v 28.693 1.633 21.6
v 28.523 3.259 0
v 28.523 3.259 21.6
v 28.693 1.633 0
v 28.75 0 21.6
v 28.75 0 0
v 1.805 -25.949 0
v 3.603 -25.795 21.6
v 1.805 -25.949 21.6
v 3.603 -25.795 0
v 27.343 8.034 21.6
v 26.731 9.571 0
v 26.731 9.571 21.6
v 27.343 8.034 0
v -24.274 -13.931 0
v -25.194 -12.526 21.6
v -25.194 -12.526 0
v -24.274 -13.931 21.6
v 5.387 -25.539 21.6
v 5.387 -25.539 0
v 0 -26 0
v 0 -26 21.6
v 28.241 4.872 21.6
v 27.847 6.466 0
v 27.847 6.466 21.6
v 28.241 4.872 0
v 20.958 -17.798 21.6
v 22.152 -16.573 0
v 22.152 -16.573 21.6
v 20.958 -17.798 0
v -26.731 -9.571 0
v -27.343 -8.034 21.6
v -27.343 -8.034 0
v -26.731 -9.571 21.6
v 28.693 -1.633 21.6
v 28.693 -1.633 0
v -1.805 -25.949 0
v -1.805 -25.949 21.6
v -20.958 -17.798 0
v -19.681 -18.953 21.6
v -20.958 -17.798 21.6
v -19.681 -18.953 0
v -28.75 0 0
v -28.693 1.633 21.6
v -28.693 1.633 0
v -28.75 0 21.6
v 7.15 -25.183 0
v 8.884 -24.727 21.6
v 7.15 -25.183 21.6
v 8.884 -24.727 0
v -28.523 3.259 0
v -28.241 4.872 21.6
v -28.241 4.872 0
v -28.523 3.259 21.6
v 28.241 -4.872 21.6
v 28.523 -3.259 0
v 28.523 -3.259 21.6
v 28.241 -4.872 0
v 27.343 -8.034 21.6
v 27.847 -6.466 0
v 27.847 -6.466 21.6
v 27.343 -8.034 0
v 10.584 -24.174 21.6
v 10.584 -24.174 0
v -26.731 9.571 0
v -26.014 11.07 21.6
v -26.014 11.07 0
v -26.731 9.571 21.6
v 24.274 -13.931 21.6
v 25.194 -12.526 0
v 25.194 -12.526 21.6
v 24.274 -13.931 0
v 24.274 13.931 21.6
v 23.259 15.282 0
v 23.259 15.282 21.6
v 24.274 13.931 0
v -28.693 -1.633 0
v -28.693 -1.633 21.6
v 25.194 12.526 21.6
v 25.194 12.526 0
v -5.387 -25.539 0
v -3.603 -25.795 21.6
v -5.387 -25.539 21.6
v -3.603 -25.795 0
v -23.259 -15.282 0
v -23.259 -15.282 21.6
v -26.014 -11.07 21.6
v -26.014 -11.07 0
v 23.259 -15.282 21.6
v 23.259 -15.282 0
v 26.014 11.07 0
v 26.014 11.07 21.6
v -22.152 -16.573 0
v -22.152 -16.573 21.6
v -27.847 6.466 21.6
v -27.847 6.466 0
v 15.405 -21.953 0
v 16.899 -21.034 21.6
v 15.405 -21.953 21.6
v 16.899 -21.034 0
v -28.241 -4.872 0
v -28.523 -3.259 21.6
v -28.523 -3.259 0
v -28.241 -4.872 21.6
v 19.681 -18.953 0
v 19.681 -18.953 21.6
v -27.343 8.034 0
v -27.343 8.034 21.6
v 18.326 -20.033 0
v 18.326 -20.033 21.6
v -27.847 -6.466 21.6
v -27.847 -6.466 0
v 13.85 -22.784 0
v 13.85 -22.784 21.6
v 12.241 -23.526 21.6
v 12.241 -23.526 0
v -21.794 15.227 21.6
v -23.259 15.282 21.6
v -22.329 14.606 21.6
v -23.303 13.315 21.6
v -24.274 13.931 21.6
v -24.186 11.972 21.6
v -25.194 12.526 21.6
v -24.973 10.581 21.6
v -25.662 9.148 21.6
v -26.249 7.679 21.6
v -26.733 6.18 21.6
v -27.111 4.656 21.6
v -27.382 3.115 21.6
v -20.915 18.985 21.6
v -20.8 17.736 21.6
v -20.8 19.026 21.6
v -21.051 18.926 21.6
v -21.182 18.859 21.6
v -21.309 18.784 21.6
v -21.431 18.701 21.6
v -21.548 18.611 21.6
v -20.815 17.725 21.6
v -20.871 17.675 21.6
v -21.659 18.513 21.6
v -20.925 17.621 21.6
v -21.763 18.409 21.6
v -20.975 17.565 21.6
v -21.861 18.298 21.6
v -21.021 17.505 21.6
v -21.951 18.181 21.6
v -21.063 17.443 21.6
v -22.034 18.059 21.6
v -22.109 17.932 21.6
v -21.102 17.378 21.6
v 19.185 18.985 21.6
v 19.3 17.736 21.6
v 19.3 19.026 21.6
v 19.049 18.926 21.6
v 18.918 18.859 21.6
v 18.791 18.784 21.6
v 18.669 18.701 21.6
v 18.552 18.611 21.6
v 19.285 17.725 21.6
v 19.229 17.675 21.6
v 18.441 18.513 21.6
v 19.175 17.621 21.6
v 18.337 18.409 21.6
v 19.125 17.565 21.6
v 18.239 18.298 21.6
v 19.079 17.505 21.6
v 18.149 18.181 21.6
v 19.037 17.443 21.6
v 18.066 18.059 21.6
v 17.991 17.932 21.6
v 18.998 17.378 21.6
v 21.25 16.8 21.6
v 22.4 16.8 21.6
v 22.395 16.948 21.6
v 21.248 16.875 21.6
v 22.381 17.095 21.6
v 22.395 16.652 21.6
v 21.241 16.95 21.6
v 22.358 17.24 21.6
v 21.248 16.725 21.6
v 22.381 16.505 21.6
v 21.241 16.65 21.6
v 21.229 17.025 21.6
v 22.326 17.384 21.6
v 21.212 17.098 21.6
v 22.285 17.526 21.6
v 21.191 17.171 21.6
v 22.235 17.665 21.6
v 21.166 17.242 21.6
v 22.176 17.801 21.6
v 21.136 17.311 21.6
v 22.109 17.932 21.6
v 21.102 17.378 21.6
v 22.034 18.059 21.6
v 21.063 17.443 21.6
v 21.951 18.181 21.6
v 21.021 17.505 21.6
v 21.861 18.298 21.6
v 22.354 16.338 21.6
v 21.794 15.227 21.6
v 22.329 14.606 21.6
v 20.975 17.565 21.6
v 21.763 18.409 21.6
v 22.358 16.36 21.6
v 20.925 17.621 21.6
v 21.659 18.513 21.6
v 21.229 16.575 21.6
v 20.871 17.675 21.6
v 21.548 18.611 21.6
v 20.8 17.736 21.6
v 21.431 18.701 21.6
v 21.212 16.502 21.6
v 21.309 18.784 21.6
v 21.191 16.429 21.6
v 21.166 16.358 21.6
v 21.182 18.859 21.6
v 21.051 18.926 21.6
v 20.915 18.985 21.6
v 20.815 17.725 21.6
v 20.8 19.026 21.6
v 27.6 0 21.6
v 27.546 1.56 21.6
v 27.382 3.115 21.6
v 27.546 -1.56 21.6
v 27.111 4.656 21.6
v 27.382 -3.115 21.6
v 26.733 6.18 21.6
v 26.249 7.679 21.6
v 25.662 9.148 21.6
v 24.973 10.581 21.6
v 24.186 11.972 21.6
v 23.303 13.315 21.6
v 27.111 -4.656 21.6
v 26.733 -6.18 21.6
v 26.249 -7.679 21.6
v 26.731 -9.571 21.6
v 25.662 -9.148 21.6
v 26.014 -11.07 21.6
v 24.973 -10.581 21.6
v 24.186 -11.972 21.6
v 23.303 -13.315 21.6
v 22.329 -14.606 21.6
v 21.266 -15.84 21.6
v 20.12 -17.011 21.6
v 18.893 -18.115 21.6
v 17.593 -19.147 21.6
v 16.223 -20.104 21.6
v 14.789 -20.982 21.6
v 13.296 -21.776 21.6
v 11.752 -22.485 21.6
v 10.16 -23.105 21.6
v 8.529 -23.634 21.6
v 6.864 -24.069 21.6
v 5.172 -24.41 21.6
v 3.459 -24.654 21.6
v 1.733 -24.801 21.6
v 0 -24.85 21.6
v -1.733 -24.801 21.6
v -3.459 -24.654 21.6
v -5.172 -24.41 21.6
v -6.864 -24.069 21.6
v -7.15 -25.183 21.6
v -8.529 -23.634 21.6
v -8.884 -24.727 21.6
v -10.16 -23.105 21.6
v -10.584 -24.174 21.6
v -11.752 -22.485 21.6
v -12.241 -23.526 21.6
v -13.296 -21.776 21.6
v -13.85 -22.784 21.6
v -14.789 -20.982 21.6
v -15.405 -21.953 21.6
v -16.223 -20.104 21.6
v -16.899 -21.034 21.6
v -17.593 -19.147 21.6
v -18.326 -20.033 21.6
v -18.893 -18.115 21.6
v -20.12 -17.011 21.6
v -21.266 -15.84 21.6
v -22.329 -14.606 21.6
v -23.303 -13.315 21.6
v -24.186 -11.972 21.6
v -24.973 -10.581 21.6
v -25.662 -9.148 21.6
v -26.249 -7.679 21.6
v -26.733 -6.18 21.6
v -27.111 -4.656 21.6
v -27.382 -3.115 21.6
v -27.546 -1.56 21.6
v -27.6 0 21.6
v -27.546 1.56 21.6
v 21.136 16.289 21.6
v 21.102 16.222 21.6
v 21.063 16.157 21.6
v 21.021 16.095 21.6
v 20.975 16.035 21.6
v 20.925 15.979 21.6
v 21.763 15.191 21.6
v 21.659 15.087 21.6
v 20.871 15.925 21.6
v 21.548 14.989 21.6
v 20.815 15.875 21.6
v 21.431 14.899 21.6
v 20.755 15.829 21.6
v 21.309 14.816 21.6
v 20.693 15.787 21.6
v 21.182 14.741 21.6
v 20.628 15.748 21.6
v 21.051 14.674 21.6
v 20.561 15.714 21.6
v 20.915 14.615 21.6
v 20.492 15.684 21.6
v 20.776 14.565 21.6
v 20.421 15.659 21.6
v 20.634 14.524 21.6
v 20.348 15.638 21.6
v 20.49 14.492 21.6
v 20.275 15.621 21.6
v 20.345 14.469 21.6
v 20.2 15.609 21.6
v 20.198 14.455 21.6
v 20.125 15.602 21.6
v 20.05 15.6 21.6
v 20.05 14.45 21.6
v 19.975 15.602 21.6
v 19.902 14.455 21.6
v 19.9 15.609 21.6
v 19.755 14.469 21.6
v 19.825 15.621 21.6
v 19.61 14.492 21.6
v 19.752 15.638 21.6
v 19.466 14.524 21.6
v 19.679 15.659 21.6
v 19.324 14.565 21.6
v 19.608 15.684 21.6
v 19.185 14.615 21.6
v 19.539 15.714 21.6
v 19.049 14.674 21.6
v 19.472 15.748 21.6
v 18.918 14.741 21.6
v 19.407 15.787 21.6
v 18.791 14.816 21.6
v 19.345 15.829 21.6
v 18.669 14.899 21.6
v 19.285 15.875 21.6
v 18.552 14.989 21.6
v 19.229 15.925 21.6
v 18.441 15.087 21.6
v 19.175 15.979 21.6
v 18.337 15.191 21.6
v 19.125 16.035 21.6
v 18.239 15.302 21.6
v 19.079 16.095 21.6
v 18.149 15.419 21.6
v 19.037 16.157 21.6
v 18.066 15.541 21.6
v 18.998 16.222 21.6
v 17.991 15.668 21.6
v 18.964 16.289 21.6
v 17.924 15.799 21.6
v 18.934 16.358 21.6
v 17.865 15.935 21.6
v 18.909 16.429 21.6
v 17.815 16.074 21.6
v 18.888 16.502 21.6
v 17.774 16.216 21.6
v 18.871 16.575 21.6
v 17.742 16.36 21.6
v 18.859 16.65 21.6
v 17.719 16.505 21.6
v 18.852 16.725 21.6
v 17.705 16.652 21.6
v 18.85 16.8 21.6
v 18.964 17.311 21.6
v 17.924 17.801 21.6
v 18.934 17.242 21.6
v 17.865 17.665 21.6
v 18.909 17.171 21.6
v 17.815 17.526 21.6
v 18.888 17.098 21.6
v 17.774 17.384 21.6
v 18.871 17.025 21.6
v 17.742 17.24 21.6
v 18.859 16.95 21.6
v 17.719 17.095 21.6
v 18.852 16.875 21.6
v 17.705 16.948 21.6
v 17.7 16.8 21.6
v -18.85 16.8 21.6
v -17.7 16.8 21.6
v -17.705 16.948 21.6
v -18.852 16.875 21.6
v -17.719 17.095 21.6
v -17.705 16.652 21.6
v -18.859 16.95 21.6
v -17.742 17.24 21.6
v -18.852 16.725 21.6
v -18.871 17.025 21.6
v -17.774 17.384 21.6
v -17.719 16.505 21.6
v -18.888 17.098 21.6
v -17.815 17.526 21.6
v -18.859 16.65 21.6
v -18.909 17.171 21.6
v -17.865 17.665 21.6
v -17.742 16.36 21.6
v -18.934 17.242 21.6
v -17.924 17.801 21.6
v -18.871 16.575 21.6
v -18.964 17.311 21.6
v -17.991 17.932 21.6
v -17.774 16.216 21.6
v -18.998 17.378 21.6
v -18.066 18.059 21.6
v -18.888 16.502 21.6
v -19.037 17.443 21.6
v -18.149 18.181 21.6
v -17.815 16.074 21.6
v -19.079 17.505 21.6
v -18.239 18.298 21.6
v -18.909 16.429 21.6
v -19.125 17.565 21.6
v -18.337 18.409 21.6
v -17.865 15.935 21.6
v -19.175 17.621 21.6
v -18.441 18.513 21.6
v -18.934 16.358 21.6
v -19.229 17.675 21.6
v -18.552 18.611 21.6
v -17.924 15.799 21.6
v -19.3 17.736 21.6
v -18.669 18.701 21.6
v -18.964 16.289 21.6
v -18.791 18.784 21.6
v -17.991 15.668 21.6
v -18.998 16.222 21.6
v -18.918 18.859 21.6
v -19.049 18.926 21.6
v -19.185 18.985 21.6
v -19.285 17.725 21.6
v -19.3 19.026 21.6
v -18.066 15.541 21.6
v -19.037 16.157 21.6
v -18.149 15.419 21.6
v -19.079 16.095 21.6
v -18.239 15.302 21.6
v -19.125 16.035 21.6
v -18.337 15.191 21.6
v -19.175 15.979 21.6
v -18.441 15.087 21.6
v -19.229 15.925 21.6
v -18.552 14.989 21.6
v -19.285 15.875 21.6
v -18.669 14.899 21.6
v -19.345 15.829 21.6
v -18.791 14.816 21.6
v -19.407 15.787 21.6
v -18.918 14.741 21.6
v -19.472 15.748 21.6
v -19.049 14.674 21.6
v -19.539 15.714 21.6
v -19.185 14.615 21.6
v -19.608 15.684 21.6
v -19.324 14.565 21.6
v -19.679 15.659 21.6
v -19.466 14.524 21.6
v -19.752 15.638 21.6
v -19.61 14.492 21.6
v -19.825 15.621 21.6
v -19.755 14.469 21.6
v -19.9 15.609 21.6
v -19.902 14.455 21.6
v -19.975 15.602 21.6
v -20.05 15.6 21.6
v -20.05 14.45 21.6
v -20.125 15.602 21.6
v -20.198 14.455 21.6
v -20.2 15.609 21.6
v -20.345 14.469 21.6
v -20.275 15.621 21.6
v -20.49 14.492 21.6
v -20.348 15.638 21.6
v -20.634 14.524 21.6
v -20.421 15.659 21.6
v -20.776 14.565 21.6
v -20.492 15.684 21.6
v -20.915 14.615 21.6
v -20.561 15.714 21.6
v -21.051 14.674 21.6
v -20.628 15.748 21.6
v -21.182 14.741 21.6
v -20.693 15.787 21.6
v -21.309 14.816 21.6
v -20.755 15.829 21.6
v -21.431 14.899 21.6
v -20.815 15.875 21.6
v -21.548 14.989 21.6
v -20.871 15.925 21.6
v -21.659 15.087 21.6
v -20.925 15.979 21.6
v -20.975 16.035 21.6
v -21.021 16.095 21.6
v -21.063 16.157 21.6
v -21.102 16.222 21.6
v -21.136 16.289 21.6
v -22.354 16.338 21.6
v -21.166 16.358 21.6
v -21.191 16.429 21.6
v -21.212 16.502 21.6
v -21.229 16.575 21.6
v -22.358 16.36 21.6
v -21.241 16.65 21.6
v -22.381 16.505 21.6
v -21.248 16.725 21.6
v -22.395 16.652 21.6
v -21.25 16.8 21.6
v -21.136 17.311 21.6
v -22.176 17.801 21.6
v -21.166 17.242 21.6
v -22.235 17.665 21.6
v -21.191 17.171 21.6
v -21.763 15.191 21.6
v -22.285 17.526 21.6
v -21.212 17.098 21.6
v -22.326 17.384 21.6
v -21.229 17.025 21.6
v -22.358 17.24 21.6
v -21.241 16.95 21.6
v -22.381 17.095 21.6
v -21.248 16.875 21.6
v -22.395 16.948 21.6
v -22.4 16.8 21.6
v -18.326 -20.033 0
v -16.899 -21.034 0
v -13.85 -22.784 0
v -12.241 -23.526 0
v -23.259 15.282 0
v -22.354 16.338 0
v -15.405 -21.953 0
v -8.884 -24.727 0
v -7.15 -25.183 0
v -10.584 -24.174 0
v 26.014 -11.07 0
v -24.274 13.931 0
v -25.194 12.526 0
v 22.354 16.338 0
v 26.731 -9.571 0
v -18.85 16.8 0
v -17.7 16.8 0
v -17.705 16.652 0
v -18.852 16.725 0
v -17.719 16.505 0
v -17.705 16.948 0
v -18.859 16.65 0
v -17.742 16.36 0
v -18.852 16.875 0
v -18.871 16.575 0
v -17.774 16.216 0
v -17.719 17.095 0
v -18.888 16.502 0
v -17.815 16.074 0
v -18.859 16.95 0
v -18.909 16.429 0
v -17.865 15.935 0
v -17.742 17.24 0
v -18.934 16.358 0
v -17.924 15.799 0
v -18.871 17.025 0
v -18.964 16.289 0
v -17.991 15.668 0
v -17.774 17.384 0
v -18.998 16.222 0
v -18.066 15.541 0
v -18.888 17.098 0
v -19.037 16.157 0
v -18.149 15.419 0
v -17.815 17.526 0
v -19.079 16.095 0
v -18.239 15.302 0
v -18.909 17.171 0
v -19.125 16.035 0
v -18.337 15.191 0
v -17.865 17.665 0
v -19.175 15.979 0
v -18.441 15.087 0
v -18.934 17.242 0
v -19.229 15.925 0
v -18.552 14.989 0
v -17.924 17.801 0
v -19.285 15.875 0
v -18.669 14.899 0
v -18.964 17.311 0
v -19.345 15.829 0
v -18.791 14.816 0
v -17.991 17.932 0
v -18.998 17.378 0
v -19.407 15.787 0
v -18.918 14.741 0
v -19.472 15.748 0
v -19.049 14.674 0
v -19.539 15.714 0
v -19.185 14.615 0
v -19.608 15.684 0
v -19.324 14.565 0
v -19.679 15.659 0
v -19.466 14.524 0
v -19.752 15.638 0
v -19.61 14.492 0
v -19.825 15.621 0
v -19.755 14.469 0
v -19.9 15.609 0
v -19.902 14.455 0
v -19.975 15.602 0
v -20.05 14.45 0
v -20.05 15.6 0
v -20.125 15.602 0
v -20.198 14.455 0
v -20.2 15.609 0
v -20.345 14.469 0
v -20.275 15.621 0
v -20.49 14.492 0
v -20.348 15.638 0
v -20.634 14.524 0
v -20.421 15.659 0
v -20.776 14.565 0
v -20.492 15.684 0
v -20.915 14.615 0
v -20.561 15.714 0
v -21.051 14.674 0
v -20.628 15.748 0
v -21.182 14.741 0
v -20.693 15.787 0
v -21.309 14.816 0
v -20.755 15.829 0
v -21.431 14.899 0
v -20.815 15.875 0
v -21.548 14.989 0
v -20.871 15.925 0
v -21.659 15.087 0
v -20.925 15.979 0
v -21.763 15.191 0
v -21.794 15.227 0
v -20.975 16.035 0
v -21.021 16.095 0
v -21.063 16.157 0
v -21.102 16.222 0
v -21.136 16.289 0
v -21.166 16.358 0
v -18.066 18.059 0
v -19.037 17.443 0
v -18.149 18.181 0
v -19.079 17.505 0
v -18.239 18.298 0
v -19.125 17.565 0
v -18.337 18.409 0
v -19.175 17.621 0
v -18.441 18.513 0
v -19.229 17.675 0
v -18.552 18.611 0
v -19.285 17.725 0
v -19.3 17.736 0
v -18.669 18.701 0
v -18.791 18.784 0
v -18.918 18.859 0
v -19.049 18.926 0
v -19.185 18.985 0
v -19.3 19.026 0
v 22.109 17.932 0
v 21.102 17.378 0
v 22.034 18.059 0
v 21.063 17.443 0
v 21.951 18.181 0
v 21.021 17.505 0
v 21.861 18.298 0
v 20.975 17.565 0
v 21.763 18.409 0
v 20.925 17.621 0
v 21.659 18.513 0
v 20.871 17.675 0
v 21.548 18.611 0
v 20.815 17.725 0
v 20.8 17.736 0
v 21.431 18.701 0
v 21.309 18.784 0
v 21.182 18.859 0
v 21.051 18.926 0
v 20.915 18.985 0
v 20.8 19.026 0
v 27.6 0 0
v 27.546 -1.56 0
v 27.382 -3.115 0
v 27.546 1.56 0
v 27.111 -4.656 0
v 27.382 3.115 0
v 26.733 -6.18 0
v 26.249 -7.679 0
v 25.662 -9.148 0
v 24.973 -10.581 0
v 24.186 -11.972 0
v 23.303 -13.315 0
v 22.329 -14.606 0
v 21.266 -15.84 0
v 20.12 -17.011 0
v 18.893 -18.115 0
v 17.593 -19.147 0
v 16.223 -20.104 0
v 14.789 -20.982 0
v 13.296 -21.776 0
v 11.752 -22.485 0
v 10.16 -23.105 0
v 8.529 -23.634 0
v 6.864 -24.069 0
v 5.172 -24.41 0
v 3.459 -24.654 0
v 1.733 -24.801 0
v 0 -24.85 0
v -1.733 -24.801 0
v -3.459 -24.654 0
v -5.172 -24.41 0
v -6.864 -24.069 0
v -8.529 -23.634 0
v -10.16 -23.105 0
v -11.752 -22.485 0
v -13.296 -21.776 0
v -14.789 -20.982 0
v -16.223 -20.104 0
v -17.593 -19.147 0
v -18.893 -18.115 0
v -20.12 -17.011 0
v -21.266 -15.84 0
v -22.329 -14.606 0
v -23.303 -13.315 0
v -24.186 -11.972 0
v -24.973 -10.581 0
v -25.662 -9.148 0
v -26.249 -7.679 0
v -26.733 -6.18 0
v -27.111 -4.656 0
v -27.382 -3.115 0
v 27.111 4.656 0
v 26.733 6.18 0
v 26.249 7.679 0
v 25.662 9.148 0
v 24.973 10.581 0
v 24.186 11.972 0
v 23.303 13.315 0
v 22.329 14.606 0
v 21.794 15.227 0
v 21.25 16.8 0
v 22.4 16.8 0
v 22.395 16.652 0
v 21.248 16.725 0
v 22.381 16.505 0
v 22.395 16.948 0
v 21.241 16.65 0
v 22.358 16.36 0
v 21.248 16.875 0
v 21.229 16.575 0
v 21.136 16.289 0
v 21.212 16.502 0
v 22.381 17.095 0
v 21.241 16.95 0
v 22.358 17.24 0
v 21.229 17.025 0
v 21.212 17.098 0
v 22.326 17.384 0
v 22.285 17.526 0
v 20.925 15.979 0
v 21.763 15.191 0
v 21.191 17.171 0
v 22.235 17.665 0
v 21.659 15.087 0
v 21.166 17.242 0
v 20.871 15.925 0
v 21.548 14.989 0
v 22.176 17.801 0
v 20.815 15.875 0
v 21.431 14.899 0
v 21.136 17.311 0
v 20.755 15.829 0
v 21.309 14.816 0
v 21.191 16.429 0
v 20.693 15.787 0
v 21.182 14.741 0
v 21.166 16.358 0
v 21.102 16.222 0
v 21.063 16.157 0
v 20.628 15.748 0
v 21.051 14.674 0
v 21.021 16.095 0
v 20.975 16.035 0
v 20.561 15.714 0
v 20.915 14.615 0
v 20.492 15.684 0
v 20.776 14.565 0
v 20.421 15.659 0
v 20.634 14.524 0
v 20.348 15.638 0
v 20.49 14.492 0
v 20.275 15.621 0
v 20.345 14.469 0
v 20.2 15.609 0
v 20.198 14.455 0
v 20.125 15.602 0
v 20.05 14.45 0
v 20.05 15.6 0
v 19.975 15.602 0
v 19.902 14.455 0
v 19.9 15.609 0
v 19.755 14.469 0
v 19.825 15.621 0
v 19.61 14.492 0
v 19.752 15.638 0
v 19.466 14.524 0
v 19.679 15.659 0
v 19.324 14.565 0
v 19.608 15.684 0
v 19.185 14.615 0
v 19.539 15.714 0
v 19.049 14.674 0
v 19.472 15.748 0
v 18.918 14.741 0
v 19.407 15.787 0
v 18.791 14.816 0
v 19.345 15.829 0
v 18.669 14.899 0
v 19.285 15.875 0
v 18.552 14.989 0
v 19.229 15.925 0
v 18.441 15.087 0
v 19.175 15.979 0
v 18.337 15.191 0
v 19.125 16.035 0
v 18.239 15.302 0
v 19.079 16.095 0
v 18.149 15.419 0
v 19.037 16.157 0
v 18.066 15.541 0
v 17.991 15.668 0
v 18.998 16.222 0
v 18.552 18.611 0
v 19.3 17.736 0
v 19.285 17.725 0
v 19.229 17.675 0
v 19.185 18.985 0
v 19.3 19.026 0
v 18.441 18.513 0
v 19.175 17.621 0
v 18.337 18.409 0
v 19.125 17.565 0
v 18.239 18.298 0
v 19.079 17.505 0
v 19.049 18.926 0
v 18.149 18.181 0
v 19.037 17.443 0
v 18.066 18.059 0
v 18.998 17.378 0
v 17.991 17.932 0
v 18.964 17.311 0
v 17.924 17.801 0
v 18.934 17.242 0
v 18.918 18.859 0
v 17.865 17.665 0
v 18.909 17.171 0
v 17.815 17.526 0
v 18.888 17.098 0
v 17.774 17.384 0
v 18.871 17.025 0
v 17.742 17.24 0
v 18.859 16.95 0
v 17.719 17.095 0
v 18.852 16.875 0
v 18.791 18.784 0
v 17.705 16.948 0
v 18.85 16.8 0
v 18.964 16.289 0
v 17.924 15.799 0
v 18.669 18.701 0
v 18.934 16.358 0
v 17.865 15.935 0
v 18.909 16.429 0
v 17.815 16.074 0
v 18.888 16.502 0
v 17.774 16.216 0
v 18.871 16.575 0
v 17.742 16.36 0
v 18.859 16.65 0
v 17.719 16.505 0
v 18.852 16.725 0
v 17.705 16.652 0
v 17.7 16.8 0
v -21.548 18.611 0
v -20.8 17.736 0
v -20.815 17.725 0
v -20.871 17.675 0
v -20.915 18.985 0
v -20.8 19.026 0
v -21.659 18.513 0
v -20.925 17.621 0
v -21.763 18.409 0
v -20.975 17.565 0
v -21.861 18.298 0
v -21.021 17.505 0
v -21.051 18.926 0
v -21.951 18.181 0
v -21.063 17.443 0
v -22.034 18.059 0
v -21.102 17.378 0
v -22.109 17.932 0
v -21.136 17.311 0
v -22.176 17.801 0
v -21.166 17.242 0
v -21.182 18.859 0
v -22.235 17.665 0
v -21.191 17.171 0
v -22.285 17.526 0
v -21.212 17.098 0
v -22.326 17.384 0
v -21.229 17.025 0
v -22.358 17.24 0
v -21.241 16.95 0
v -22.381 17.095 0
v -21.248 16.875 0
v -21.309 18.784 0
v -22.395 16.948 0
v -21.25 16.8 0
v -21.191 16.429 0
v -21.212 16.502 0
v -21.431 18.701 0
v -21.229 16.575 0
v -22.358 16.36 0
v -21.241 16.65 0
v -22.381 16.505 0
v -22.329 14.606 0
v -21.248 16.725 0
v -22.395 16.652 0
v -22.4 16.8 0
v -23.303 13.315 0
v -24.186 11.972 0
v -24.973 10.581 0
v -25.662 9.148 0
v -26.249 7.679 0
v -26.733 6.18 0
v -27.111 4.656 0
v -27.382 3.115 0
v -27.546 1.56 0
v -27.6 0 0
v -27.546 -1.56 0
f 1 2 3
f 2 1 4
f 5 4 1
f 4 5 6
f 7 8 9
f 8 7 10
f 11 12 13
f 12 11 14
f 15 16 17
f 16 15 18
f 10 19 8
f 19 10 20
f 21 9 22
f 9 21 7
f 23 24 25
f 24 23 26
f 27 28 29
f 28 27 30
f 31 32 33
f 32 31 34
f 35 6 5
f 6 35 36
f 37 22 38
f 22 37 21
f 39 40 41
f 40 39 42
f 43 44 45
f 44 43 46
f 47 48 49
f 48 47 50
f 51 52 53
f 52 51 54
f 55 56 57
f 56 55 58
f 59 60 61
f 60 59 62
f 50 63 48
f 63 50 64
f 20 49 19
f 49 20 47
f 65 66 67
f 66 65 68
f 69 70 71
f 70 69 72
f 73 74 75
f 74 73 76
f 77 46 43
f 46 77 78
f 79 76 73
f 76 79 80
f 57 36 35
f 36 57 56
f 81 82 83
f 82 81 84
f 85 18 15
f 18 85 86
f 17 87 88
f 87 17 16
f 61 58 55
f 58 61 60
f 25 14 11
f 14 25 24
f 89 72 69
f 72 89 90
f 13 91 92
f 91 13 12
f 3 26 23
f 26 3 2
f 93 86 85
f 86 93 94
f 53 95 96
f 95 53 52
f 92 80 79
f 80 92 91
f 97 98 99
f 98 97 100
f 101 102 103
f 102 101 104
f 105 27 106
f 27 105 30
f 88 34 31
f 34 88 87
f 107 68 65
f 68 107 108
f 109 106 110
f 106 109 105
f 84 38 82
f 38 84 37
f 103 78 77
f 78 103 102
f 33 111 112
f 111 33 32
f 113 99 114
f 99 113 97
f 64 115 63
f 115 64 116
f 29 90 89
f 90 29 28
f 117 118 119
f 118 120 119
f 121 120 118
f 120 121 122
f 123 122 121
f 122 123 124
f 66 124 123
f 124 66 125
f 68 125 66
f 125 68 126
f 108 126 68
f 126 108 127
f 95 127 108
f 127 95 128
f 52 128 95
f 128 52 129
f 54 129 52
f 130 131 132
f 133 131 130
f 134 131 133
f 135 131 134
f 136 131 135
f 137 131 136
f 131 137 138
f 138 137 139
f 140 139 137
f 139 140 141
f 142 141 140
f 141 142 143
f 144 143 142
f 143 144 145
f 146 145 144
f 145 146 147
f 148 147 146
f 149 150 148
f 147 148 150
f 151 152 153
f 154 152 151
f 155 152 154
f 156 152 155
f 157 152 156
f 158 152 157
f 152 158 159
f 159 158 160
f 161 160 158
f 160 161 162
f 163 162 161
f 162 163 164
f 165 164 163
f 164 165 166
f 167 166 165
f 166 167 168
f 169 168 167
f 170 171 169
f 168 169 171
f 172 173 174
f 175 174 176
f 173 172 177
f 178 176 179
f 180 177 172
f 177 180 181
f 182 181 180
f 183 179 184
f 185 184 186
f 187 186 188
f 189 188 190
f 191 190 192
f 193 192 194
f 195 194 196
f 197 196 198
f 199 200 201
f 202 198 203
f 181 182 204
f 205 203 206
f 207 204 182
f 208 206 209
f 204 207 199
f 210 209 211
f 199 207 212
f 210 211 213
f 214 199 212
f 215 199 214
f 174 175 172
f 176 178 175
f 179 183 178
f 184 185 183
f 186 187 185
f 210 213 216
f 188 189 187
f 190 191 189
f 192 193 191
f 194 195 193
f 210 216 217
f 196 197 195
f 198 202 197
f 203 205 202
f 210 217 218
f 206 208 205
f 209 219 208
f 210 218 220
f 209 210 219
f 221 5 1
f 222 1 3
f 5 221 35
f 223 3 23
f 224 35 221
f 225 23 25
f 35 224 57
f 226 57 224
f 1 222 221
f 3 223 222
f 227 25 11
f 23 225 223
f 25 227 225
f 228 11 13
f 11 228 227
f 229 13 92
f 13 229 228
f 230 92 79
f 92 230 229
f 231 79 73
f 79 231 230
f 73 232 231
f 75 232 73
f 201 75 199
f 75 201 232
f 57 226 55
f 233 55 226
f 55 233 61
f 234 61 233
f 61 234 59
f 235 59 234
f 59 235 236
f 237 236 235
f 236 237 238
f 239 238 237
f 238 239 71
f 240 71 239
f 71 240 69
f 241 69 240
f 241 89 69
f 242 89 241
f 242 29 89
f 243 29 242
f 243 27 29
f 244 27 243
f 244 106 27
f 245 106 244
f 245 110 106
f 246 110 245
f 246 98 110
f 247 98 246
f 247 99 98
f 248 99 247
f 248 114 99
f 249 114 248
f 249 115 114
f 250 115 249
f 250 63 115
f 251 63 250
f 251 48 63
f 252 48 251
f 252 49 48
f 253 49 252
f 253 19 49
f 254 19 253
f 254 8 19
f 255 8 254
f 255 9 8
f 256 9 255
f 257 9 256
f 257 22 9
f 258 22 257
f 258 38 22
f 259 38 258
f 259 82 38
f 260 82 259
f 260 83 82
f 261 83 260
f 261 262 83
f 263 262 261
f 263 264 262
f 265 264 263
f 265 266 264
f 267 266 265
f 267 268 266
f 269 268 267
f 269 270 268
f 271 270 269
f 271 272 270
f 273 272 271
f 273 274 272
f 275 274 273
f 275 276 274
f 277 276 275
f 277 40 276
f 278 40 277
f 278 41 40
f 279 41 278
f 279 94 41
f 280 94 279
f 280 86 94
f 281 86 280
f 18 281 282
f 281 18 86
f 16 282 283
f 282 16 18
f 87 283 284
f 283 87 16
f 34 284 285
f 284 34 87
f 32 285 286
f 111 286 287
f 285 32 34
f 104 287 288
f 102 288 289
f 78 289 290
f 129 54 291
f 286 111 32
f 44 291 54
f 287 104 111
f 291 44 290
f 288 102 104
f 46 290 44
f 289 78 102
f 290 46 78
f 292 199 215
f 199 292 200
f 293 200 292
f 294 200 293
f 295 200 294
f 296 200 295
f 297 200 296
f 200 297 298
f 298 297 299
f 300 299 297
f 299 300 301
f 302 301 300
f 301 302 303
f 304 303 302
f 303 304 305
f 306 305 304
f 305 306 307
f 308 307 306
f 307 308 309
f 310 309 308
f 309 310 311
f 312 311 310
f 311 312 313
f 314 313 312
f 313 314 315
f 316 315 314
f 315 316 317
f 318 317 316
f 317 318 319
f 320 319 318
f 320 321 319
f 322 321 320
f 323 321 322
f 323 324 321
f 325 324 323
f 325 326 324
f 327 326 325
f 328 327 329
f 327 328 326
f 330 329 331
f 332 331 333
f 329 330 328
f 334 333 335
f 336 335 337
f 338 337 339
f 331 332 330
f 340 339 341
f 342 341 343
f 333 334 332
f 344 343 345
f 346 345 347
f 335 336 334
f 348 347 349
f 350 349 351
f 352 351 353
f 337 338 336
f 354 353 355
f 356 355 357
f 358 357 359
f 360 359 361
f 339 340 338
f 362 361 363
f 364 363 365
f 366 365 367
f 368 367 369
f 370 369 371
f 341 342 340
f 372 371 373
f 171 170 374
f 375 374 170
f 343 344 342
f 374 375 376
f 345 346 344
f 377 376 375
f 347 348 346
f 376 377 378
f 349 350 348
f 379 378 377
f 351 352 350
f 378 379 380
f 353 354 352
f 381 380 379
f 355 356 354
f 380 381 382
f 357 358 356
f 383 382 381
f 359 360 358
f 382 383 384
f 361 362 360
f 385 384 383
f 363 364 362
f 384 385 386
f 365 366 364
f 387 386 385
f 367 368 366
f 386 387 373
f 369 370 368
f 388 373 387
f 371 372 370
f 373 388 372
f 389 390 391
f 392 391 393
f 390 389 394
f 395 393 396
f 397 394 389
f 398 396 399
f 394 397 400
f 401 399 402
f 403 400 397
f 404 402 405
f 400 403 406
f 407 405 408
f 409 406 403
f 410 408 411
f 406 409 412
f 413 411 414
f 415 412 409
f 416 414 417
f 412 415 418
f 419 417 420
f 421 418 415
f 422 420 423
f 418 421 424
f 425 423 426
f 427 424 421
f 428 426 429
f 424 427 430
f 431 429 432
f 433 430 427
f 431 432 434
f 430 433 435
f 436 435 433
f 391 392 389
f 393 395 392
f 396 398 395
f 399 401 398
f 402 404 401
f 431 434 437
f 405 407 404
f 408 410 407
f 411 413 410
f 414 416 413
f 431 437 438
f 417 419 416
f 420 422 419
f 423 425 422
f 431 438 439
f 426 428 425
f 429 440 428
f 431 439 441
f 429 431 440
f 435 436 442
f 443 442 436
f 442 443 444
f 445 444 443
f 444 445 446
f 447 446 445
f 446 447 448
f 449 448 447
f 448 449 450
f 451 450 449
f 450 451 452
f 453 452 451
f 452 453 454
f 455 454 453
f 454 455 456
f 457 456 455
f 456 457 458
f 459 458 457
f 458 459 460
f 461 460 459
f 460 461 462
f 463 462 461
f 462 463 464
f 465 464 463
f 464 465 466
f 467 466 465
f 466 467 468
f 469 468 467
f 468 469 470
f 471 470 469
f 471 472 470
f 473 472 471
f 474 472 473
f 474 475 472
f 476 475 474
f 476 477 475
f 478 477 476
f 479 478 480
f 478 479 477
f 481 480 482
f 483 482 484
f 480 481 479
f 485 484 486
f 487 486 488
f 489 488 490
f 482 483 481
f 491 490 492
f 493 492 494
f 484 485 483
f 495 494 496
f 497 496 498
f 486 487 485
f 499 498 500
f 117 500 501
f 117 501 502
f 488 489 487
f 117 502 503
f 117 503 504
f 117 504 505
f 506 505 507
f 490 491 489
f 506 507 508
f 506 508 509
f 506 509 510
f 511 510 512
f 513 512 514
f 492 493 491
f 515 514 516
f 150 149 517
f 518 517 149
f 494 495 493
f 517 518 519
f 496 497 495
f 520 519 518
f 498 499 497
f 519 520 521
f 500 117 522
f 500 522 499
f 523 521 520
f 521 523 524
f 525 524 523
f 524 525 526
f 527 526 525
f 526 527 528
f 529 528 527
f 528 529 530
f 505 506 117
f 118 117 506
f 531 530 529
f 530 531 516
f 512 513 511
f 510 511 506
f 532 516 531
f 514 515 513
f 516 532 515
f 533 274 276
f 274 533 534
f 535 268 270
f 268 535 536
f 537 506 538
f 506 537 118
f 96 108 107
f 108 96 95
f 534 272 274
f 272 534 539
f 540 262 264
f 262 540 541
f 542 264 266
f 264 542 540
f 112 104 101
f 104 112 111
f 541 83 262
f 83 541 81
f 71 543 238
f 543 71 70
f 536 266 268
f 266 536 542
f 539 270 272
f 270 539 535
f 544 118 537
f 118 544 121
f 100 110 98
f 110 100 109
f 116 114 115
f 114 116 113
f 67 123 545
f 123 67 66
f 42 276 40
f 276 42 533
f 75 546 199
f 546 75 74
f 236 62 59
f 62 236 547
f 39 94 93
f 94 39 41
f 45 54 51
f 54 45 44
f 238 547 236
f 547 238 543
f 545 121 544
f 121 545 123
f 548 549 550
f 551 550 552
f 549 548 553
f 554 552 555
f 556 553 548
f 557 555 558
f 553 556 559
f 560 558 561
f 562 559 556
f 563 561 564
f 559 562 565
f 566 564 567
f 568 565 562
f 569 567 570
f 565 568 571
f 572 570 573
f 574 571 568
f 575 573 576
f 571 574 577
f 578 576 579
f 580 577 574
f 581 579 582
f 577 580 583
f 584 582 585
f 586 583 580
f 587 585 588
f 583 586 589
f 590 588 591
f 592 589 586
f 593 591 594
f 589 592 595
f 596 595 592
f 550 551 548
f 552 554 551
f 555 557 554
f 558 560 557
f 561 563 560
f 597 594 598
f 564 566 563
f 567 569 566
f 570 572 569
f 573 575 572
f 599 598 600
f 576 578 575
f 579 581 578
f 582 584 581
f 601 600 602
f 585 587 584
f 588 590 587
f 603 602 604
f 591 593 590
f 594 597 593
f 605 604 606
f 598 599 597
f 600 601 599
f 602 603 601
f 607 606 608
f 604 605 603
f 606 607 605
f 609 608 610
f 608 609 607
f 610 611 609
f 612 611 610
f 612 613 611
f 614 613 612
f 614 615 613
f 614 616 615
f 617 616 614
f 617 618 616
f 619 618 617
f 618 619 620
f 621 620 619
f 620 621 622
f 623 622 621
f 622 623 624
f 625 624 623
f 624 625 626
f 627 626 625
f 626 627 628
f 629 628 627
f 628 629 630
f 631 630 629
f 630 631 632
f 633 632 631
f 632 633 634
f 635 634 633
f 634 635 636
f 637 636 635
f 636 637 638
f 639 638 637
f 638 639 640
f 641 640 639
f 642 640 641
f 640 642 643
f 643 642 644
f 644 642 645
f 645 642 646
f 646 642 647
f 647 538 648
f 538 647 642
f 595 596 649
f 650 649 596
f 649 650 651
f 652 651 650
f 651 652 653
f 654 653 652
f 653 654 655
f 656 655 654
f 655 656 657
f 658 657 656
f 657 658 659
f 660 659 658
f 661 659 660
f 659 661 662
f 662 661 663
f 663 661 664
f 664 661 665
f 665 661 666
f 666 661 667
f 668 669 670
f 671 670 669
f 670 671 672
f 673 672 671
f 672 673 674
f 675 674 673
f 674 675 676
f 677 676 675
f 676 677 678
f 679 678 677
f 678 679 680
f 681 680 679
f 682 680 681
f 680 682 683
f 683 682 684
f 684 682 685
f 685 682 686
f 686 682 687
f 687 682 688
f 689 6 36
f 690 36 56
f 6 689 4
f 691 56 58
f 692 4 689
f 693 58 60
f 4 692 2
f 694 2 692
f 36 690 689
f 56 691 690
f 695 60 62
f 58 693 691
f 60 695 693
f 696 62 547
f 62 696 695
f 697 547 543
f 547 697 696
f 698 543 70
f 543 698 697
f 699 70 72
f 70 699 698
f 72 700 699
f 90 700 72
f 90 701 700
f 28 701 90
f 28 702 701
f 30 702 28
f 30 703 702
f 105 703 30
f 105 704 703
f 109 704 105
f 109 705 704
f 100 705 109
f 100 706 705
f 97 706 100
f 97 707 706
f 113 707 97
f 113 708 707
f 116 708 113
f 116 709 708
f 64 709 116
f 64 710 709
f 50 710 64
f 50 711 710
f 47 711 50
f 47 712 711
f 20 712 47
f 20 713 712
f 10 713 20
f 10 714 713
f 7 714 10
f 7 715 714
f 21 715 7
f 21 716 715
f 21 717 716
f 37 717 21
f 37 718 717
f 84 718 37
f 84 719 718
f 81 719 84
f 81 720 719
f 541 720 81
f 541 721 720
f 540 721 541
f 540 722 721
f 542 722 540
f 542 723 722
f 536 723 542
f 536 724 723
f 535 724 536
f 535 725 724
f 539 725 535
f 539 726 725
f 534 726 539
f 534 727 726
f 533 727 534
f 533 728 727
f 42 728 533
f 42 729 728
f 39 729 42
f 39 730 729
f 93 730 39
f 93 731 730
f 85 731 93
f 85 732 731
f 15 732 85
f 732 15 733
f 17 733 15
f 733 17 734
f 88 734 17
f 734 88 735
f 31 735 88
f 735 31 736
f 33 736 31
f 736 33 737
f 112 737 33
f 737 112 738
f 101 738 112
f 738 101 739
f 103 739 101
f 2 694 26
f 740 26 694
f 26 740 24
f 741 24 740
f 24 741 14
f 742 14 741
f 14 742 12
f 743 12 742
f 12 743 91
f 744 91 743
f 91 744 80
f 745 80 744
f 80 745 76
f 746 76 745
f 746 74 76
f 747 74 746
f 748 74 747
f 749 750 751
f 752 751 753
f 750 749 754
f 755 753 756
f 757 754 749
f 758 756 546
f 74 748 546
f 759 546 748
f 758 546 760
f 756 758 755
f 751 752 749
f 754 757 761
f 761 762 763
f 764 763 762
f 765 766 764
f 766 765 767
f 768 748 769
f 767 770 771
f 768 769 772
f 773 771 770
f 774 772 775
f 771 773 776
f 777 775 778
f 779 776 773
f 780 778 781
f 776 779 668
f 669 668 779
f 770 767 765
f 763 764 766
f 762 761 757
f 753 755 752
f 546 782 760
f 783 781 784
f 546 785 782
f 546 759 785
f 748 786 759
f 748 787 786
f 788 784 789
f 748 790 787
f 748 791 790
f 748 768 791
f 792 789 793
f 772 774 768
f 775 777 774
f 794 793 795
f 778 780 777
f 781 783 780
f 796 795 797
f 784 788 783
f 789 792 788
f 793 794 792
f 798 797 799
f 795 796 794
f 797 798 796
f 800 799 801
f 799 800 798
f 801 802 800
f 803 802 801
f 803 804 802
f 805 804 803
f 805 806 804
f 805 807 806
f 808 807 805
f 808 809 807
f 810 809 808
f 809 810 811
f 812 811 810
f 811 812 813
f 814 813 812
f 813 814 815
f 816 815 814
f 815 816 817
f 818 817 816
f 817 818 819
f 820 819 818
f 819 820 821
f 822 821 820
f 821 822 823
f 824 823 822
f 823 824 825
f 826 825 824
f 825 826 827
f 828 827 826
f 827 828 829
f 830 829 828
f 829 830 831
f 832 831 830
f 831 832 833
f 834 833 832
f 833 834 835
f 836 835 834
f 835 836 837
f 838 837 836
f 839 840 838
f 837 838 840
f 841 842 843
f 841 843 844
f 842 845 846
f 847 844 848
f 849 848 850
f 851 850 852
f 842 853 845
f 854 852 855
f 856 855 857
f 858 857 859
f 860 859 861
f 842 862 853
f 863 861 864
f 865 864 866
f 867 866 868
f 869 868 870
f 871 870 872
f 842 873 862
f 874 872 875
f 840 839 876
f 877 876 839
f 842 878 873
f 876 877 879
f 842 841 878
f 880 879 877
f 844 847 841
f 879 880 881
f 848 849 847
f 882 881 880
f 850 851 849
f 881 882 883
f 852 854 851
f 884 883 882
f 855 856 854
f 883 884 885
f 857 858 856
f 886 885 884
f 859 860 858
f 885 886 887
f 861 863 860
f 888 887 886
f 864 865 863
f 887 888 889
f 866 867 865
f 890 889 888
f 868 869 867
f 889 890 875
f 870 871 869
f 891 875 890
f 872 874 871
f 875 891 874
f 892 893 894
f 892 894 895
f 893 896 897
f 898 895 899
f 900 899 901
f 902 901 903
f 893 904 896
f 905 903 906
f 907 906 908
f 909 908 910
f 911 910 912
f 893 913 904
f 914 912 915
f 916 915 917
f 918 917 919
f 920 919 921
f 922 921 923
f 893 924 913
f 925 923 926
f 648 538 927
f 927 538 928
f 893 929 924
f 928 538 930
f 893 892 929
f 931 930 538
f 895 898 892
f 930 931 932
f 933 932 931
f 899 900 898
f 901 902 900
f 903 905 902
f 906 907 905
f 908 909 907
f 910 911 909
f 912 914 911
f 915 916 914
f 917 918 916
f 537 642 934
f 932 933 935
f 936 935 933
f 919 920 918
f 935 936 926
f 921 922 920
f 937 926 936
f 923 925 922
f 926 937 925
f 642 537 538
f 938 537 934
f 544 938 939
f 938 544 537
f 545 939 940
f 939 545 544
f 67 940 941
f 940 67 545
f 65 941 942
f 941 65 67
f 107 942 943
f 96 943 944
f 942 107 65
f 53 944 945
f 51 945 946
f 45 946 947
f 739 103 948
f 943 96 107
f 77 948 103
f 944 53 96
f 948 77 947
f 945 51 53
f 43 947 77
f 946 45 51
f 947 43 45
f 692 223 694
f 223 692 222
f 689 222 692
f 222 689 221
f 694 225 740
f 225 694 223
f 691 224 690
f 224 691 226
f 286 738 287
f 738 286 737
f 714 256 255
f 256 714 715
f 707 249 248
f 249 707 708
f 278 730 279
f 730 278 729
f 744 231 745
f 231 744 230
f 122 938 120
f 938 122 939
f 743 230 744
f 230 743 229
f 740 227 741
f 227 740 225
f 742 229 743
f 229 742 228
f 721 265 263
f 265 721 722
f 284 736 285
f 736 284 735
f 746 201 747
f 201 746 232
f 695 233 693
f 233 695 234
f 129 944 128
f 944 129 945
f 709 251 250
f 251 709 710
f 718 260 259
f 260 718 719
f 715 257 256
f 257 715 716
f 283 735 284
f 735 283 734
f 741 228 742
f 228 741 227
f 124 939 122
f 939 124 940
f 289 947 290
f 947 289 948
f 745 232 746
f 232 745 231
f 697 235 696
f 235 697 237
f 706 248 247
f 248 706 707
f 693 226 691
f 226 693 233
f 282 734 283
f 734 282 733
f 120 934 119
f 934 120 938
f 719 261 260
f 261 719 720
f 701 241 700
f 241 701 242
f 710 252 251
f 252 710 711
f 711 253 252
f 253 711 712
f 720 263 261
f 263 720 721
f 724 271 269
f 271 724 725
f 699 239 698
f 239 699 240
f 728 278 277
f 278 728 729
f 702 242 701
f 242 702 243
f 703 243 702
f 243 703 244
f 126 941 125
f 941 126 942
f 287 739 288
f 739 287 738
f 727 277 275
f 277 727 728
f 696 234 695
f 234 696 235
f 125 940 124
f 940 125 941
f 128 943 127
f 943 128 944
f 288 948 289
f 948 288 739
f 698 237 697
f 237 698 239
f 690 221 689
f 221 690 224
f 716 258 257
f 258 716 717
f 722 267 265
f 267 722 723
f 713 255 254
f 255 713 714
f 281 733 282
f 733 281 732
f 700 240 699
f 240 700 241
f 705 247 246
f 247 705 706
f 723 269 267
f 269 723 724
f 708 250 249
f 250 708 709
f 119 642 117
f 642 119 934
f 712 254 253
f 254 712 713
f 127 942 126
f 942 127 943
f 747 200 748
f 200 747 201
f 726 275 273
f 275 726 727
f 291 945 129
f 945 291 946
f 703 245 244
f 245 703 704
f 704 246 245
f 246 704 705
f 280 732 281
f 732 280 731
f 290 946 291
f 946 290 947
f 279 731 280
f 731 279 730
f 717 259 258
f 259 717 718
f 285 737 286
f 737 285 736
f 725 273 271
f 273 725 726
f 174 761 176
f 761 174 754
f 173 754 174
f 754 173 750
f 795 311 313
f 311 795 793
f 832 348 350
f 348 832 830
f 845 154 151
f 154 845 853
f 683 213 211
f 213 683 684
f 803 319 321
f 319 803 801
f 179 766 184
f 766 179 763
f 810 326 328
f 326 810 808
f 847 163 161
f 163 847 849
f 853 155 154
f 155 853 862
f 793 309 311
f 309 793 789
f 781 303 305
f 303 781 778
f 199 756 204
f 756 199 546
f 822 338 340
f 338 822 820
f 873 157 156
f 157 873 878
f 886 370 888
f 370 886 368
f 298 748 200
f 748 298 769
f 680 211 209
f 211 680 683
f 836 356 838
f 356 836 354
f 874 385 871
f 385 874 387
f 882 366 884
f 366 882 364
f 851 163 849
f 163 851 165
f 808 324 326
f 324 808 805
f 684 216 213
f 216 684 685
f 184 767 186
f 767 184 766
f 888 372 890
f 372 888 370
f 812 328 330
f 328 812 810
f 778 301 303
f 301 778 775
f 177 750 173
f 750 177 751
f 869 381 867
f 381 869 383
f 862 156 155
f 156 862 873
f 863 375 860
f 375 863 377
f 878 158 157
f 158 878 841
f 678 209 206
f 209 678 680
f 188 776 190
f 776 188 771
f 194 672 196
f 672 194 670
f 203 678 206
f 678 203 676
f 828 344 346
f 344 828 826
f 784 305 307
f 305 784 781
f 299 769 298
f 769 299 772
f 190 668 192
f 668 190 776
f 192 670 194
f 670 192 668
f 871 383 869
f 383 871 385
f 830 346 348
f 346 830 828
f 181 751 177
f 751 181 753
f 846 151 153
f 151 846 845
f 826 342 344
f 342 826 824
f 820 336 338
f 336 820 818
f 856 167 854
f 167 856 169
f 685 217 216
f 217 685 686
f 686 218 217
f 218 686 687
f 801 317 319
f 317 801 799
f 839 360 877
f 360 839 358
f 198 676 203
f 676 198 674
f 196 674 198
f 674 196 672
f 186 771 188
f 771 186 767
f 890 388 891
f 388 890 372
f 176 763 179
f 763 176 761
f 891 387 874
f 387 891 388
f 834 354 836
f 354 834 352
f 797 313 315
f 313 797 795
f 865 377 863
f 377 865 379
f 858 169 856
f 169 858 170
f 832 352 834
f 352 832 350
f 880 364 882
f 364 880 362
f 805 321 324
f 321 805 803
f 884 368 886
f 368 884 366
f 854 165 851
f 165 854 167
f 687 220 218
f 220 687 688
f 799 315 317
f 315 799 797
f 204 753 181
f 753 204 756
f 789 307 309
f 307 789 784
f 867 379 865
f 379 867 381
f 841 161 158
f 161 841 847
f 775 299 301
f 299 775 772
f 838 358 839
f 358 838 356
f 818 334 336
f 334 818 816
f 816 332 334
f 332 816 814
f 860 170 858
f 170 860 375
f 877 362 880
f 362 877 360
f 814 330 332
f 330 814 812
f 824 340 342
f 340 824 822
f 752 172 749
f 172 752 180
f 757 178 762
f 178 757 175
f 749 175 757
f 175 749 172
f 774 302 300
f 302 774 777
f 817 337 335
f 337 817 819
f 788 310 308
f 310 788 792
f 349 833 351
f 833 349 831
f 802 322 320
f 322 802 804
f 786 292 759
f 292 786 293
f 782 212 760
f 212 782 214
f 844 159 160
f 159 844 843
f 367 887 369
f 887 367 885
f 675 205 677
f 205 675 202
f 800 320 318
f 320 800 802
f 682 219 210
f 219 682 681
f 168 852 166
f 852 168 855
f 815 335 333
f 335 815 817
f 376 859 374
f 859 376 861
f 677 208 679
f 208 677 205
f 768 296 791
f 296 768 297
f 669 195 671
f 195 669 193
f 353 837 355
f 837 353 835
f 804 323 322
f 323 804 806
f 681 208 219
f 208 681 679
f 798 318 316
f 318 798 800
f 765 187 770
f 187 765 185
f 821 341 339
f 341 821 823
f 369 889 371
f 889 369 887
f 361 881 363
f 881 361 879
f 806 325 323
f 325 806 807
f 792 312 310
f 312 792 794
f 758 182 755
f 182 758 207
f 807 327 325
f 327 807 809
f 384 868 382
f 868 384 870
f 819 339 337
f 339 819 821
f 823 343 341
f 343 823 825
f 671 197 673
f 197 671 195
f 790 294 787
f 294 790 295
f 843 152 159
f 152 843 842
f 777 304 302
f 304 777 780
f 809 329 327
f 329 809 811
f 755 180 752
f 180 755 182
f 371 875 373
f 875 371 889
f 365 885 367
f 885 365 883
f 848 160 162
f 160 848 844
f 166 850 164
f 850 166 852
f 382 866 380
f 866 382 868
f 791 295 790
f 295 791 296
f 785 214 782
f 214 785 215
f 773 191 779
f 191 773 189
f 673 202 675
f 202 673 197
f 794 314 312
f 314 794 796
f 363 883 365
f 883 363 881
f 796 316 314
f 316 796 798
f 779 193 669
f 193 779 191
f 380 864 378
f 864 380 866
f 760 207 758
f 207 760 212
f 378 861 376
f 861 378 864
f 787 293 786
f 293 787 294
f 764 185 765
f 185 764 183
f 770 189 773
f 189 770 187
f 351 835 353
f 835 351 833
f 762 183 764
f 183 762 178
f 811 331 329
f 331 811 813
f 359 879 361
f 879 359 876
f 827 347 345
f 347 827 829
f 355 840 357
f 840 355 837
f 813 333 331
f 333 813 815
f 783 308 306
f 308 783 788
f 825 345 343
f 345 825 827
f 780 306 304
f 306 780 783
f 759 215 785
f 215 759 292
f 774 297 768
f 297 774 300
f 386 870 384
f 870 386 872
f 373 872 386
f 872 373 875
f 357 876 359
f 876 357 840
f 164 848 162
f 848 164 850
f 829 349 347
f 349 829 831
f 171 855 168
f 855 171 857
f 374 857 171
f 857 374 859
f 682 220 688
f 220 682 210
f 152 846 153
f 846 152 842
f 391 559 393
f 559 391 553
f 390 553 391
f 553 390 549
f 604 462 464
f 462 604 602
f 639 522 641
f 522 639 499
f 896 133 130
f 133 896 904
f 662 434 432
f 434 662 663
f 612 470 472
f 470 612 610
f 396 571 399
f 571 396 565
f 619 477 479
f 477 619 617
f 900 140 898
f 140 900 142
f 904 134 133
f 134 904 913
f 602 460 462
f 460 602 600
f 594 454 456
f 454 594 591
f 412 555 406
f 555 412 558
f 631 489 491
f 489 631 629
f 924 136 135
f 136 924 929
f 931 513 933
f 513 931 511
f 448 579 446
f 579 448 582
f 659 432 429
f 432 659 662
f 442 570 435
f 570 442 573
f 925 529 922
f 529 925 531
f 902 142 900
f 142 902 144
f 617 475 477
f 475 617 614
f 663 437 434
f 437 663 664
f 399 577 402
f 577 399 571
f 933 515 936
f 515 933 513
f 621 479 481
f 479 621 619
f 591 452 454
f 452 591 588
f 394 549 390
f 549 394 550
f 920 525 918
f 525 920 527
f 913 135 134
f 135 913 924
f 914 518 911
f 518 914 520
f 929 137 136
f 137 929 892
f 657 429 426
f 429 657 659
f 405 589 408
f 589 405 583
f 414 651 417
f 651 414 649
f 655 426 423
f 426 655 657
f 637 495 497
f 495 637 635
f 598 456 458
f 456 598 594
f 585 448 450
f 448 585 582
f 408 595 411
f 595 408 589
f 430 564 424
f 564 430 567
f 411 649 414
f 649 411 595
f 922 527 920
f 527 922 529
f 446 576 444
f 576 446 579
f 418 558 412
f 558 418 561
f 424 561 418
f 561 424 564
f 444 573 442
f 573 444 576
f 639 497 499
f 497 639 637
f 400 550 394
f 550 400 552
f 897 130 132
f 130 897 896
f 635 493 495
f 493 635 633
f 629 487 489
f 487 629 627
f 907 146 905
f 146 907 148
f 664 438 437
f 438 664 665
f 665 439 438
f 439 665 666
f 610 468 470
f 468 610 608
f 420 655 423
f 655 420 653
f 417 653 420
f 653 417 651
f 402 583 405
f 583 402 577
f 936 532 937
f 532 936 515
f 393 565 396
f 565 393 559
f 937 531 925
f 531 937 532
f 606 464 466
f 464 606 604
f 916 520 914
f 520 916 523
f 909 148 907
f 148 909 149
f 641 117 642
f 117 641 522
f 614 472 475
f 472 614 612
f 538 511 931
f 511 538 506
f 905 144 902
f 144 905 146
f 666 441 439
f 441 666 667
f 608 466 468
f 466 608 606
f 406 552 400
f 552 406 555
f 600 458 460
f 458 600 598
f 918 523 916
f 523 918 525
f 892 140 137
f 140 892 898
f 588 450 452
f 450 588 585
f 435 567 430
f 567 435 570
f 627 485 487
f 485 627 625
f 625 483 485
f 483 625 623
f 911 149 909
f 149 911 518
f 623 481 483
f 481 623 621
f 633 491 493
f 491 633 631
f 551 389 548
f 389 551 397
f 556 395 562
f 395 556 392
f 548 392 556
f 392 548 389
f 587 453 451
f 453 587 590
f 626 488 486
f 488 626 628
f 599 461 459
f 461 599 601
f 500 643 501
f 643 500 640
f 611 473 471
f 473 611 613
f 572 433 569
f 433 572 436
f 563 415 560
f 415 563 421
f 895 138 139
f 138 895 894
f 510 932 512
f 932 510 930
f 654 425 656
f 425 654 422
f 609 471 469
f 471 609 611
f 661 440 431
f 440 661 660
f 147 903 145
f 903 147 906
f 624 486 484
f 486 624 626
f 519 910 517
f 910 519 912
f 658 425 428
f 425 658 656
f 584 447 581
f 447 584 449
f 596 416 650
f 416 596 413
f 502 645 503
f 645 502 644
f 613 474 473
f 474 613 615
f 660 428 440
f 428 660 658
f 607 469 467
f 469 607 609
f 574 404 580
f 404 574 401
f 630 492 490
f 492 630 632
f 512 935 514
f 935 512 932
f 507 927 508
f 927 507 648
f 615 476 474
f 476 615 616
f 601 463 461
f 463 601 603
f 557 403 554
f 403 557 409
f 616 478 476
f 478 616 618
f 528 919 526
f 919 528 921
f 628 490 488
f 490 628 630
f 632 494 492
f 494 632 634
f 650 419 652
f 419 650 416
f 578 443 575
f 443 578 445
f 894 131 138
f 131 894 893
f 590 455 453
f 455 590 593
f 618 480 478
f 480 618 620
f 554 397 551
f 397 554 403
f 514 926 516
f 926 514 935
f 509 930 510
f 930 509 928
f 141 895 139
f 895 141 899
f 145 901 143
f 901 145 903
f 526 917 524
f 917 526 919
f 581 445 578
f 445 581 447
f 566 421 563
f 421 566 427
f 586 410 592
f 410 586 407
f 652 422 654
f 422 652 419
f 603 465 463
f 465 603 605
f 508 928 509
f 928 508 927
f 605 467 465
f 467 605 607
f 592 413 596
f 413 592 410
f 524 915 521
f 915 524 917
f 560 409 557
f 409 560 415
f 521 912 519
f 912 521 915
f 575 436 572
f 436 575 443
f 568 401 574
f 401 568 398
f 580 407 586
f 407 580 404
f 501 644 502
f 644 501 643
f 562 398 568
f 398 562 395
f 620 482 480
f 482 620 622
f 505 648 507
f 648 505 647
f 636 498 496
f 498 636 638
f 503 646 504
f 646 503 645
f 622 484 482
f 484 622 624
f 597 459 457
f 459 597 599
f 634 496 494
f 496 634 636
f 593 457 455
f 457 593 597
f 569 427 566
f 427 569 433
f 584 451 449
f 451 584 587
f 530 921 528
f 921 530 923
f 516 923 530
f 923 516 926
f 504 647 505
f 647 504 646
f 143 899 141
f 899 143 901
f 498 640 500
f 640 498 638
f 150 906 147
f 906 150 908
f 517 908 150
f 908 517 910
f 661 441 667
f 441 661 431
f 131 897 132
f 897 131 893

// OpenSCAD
/* [Global] */

// major radius
r_major = 28.75;

// minor radius
r_minor = 26;

// width of strap
s_width = 21.6;

// thickness of strap
thickness = 1.15;

/* [Hidden] */
$fn=100;

pin_r = 1.2; // pin radius

c_width = s_width+thickness;
pebble = [42.5,16,s_width+thickness];

module pin()
{
    difference()
    {
        cylinder(r=pin_r+thickness,h=s_width,center=true);
        cylinder(r=pin_r,h=c_width,center=true);
        translate([0,pin_r,0])
            cube([pin_r*1.25,pin_r*2,c_width],center=true);
    }
}

translate([0,0,s_width/2])
{
	difference()
	{
		resize([r_major*2,r_minor*2,0])
			cylinder(r=(r_major+r_minor)/2, h=s_width, center=true);
		resize([(r_major-thickness)*2,(r_minor-thickness)*2,0])
			cylinder(r=(r_major+r_minor)/2, h=c_width, center=true);
		translate([0,r_minor-pebble[1]/2,0]) cube(pebble,center=true);
	}
	
	for(i=[1,-1]) translate([i*(pebble[0]/2-pin_r),r_minor-pebble[1]/2-pin_r,0]) pin();
}
